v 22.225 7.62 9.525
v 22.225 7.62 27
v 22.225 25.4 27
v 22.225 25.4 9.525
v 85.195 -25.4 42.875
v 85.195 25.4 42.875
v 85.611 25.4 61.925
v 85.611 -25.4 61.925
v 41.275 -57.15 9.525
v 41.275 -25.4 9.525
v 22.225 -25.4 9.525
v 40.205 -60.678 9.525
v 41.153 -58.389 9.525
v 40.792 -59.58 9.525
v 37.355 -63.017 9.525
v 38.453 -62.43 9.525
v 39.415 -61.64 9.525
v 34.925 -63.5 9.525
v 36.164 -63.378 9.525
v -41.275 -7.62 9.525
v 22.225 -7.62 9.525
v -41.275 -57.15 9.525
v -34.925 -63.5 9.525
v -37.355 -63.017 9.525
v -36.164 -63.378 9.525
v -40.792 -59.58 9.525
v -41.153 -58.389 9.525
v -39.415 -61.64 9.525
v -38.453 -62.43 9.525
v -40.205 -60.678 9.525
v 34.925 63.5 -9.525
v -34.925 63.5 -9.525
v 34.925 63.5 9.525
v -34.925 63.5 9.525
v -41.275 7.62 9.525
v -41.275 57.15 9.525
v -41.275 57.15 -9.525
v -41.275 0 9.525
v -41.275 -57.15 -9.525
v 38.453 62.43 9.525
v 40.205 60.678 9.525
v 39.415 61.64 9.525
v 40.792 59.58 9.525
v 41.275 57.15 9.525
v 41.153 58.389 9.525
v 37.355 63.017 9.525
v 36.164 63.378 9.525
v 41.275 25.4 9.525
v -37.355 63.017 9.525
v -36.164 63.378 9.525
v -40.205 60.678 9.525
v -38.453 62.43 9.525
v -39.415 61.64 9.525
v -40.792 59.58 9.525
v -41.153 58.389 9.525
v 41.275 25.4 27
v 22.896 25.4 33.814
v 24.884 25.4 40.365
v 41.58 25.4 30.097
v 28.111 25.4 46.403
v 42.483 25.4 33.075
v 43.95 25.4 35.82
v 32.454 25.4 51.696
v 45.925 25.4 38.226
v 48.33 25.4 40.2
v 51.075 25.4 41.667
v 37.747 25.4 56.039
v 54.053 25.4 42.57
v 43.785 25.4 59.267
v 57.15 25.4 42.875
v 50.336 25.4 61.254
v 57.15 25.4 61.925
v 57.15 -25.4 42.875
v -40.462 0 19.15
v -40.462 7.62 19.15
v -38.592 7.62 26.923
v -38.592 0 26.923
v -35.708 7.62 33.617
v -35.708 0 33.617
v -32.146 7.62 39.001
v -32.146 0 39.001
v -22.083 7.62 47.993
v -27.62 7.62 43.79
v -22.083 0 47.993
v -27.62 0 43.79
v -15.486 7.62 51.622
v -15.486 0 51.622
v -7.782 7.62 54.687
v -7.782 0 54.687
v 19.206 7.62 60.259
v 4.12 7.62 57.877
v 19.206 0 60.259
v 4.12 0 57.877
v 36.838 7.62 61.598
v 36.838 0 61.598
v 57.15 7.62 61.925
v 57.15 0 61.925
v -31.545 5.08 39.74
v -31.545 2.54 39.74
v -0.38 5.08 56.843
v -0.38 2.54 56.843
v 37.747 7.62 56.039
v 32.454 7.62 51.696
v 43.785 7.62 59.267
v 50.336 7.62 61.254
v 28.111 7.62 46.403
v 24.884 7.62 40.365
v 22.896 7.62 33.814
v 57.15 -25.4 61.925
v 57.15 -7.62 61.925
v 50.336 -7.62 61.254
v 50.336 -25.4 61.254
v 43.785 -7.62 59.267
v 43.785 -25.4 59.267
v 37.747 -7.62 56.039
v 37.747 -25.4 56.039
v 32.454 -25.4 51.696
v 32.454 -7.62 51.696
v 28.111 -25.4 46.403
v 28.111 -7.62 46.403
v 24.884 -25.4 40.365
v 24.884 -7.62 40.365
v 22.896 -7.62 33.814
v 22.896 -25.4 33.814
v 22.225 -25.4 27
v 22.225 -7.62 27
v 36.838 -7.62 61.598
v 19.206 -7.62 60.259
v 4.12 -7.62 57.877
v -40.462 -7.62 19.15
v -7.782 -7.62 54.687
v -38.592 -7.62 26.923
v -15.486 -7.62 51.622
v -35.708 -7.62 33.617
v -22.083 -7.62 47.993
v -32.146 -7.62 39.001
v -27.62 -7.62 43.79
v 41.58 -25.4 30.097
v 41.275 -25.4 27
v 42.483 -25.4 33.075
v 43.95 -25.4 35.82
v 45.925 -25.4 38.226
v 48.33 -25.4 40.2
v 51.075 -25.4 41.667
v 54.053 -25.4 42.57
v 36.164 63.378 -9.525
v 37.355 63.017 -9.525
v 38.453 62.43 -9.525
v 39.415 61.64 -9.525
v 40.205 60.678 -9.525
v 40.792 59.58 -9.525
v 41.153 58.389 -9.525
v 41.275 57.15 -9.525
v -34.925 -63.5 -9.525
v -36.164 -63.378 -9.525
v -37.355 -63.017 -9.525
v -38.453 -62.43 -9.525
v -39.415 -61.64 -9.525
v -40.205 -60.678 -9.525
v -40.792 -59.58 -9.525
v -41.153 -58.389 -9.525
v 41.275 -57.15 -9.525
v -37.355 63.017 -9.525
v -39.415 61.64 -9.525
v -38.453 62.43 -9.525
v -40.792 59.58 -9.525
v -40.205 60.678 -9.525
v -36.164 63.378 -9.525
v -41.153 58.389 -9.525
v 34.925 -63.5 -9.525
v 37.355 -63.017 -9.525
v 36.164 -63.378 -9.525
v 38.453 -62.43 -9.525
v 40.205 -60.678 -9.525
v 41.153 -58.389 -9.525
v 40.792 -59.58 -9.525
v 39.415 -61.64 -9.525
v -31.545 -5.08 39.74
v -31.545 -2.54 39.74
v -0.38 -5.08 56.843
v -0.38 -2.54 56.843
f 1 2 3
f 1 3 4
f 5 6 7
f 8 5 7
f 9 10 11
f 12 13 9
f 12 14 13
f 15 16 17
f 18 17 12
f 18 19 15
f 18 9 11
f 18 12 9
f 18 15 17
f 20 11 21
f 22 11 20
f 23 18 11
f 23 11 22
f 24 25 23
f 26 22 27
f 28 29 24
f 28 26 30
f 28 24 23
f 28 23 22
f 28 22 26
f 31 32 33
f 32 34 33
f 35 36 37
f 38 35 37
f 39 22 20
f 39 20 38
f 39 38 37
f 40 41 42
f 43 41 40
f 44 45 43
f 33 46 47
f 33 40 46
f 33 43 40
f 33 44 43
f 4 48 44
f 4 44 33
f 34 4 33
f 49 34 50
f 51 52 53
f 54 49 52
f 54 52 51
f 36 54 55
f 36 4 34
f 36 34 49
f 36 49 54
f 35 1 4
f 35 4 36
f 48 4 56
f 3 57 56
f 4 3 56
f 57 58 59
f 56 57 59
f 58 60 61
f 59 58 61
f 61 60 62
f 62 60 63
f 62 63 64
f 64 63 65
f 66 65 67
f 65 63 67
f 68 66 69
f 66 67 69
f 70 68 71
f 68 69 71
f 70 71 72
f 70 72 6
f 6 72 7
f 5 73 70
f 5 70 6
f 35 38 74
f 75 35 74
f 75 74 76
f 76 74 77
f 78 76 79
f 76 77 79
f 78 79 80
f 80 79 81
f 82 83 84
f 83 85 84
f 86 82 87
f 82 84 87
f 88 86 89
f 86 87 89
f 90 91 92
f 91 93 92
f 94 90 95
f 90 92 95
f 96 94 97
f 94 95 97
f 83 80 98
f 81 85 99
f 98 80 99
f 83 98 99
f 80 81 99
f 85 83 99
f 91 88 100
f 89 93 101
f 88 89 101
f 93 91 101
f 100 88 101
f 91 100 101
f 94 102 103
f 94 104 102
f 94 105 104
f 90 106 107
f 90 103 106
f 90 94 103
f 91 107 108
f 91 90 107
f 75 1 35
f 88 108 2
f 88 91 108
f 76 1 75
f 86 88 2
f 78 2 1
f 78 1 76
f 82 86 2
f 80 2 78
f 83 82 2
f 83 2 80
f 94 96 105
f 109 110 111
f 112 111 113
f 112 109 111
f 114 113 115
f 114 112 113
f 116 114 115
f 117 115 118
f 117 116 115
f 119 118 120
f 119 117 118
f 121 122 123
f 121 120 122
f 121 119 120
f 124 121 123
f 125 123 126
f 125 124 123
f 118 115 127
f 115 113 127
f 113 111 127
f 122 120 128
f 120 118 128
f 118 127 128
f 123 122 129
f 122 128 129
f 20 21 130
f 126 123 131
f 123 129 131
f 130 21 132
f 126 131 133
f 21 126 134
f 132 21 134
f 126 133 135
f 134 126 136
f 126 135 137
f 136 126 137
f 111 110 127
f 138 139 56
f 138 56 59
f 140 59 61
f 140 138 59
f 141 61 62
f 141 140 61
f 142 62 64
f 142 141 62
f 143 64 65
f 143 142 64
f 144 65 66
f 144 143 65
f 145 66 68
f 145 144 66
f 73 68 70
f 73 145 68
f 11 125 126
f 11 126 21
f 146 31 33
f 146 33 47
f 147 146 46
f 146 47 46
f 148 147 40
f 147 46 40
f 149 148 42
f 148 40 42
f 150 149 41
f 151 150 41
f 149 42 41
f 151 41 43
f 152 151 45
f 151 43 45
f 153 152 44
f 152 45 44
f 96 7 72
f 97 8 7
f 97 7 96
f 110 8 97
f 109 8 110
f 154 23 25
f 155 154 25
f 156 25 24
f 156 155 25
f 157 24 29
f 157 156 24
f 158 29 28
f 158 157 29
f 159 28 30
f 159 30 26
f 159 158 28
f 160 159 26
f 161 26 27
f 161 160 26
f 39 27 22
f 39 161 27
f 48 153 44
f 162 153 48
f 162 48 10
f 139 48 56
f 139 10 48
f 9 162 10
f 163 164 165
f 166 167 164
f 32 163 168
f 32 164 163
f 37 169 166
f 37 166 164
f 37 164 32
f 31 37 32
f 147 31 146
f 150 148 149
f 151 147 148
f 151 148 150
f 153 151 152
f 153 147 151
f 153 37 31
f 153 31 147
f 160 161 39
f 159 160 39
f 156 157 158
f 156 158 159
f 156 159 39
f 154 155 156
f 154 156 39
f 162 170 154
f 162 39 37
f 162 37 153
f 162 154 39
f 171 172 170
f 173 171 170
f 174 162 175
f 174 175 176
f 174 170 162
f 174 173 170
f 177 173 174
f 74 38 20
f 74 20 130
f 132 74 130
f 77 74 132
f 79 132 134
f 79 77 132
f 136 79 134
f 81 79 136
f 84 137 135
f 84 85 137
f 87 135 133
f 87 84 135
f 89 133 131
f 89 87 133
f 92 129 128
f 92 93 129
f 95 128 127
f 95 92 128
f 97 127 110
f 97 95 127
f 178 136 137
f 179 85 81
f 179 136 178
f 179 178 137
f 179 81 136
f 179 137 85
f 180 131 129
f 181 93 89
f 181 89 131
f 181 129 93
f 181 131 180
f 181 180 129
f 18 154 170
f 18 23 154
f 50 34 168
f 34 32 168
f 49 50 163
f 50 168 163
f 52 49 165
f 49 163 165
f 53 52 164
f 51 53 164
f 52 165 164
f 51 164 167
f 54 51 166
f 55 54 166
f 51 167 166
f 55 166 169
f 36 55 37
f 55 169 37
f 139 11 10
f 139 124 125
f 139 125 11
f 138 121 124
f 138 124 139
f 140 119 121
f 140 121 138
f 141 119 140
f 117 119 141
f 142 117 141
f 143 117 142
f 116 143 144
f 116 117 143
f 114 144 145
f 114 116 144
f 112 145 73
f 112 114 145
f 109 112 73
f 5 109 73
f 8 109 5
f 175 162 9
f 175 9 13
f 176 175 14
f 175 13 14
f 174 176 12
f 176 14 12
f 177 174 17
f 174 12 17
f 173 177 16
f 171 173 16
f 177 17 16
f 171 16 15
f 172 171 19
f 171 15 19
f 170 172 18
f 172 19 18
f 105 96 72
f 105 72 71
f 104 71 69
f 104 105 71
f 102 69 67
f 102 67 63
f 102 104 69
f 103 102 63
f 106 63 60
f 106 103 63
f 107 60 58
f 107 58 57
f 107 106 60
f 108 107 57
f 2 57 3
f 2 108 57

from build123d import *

# Parameters (mm, degrees)
F1_DEPTH = 63.5
F2_DEPTH = 25.4
F3_DEPTH = 7.62
F4_R     = 6.35


with BuildPart() as f1:
    # F0 (on Front) → F1 (new body, symmetric)
    with BuildSketch(Plane.XZ):
        Polygon((-41.275, -9.525), (41.275, -9.525), (41.275, 9.525), (22.225, 9.525), (-41.275, 9.525), align=None)
    extrude(amount=F1_DEPTH, both=True)

    # F0 (on Front) → F2 (join, symmetric)
    with BuildSketch(Plane.XZ):
        with BuildLine():
            Line((22.225, 9.525), (41.275, 9.525))
            Line((41.275, 9.525), (41.275, 27.0002))
            ThreePointArc((41.275, 27.0002), (45.92468, 38.22552), (57.15, 42.8752))
            Line((57.15, 42.8752), (60.325, 42.8752))
            Line((60.325, 42.8752), (60.325, 61.9252))
            Line((60.325, 61.9252), (57.15, 61.9252))
            ThreePointArc((57.15, 61.9252), (32.454296, 51.695904), (22.225, 27.0002))
            Line((22.225, 27.0002), (22.225, 9.525))
        make_face()
        Polygon((85.611328, 61.9252), (60.325, 61.9252), (60.325, 42.8752), (85.194737, 42.8752), align=None)
    extrude(amount=F2_DEPTH, both=True)

    # F0 (on Front) → F3 (join, symmetric)
    with BuildSketch(Plane.XZ):
        with BuildLine():
            add(Edge.make_bspline(
                [(-41.275, 9.525), (-40.618513, 46.65922), (-15.205906, 62.490027), (57.15, 61.9252)],
                knots=[0, 0, 0, 0, 111.504536, 111.504536, 111.504536, 111.504536], degree=3))
            Line((-41.275, 9.525), (22.225, 9.525))
            Line((22.225, 9.525), (22.225, 27.0002))
            ThreePointArc((22.225, 27.0002), (32.454296, 51.695904), (57.15, 61.9252))
        make_face()
    extrude(amount=F3_DEPTH, both=True)

    # F4
    f4_edges = [f1.edges().sort_by_distance(p)[0] for p in [
        (41.275, -63.5, 0),
        (41.275, 63.5, 0),
        (-41.275, -63.5, 0),
        (-41.275, 63.5, 0),
    ]]
    fillet(f4_edges, radius=F4_R)


solid = f1.part
